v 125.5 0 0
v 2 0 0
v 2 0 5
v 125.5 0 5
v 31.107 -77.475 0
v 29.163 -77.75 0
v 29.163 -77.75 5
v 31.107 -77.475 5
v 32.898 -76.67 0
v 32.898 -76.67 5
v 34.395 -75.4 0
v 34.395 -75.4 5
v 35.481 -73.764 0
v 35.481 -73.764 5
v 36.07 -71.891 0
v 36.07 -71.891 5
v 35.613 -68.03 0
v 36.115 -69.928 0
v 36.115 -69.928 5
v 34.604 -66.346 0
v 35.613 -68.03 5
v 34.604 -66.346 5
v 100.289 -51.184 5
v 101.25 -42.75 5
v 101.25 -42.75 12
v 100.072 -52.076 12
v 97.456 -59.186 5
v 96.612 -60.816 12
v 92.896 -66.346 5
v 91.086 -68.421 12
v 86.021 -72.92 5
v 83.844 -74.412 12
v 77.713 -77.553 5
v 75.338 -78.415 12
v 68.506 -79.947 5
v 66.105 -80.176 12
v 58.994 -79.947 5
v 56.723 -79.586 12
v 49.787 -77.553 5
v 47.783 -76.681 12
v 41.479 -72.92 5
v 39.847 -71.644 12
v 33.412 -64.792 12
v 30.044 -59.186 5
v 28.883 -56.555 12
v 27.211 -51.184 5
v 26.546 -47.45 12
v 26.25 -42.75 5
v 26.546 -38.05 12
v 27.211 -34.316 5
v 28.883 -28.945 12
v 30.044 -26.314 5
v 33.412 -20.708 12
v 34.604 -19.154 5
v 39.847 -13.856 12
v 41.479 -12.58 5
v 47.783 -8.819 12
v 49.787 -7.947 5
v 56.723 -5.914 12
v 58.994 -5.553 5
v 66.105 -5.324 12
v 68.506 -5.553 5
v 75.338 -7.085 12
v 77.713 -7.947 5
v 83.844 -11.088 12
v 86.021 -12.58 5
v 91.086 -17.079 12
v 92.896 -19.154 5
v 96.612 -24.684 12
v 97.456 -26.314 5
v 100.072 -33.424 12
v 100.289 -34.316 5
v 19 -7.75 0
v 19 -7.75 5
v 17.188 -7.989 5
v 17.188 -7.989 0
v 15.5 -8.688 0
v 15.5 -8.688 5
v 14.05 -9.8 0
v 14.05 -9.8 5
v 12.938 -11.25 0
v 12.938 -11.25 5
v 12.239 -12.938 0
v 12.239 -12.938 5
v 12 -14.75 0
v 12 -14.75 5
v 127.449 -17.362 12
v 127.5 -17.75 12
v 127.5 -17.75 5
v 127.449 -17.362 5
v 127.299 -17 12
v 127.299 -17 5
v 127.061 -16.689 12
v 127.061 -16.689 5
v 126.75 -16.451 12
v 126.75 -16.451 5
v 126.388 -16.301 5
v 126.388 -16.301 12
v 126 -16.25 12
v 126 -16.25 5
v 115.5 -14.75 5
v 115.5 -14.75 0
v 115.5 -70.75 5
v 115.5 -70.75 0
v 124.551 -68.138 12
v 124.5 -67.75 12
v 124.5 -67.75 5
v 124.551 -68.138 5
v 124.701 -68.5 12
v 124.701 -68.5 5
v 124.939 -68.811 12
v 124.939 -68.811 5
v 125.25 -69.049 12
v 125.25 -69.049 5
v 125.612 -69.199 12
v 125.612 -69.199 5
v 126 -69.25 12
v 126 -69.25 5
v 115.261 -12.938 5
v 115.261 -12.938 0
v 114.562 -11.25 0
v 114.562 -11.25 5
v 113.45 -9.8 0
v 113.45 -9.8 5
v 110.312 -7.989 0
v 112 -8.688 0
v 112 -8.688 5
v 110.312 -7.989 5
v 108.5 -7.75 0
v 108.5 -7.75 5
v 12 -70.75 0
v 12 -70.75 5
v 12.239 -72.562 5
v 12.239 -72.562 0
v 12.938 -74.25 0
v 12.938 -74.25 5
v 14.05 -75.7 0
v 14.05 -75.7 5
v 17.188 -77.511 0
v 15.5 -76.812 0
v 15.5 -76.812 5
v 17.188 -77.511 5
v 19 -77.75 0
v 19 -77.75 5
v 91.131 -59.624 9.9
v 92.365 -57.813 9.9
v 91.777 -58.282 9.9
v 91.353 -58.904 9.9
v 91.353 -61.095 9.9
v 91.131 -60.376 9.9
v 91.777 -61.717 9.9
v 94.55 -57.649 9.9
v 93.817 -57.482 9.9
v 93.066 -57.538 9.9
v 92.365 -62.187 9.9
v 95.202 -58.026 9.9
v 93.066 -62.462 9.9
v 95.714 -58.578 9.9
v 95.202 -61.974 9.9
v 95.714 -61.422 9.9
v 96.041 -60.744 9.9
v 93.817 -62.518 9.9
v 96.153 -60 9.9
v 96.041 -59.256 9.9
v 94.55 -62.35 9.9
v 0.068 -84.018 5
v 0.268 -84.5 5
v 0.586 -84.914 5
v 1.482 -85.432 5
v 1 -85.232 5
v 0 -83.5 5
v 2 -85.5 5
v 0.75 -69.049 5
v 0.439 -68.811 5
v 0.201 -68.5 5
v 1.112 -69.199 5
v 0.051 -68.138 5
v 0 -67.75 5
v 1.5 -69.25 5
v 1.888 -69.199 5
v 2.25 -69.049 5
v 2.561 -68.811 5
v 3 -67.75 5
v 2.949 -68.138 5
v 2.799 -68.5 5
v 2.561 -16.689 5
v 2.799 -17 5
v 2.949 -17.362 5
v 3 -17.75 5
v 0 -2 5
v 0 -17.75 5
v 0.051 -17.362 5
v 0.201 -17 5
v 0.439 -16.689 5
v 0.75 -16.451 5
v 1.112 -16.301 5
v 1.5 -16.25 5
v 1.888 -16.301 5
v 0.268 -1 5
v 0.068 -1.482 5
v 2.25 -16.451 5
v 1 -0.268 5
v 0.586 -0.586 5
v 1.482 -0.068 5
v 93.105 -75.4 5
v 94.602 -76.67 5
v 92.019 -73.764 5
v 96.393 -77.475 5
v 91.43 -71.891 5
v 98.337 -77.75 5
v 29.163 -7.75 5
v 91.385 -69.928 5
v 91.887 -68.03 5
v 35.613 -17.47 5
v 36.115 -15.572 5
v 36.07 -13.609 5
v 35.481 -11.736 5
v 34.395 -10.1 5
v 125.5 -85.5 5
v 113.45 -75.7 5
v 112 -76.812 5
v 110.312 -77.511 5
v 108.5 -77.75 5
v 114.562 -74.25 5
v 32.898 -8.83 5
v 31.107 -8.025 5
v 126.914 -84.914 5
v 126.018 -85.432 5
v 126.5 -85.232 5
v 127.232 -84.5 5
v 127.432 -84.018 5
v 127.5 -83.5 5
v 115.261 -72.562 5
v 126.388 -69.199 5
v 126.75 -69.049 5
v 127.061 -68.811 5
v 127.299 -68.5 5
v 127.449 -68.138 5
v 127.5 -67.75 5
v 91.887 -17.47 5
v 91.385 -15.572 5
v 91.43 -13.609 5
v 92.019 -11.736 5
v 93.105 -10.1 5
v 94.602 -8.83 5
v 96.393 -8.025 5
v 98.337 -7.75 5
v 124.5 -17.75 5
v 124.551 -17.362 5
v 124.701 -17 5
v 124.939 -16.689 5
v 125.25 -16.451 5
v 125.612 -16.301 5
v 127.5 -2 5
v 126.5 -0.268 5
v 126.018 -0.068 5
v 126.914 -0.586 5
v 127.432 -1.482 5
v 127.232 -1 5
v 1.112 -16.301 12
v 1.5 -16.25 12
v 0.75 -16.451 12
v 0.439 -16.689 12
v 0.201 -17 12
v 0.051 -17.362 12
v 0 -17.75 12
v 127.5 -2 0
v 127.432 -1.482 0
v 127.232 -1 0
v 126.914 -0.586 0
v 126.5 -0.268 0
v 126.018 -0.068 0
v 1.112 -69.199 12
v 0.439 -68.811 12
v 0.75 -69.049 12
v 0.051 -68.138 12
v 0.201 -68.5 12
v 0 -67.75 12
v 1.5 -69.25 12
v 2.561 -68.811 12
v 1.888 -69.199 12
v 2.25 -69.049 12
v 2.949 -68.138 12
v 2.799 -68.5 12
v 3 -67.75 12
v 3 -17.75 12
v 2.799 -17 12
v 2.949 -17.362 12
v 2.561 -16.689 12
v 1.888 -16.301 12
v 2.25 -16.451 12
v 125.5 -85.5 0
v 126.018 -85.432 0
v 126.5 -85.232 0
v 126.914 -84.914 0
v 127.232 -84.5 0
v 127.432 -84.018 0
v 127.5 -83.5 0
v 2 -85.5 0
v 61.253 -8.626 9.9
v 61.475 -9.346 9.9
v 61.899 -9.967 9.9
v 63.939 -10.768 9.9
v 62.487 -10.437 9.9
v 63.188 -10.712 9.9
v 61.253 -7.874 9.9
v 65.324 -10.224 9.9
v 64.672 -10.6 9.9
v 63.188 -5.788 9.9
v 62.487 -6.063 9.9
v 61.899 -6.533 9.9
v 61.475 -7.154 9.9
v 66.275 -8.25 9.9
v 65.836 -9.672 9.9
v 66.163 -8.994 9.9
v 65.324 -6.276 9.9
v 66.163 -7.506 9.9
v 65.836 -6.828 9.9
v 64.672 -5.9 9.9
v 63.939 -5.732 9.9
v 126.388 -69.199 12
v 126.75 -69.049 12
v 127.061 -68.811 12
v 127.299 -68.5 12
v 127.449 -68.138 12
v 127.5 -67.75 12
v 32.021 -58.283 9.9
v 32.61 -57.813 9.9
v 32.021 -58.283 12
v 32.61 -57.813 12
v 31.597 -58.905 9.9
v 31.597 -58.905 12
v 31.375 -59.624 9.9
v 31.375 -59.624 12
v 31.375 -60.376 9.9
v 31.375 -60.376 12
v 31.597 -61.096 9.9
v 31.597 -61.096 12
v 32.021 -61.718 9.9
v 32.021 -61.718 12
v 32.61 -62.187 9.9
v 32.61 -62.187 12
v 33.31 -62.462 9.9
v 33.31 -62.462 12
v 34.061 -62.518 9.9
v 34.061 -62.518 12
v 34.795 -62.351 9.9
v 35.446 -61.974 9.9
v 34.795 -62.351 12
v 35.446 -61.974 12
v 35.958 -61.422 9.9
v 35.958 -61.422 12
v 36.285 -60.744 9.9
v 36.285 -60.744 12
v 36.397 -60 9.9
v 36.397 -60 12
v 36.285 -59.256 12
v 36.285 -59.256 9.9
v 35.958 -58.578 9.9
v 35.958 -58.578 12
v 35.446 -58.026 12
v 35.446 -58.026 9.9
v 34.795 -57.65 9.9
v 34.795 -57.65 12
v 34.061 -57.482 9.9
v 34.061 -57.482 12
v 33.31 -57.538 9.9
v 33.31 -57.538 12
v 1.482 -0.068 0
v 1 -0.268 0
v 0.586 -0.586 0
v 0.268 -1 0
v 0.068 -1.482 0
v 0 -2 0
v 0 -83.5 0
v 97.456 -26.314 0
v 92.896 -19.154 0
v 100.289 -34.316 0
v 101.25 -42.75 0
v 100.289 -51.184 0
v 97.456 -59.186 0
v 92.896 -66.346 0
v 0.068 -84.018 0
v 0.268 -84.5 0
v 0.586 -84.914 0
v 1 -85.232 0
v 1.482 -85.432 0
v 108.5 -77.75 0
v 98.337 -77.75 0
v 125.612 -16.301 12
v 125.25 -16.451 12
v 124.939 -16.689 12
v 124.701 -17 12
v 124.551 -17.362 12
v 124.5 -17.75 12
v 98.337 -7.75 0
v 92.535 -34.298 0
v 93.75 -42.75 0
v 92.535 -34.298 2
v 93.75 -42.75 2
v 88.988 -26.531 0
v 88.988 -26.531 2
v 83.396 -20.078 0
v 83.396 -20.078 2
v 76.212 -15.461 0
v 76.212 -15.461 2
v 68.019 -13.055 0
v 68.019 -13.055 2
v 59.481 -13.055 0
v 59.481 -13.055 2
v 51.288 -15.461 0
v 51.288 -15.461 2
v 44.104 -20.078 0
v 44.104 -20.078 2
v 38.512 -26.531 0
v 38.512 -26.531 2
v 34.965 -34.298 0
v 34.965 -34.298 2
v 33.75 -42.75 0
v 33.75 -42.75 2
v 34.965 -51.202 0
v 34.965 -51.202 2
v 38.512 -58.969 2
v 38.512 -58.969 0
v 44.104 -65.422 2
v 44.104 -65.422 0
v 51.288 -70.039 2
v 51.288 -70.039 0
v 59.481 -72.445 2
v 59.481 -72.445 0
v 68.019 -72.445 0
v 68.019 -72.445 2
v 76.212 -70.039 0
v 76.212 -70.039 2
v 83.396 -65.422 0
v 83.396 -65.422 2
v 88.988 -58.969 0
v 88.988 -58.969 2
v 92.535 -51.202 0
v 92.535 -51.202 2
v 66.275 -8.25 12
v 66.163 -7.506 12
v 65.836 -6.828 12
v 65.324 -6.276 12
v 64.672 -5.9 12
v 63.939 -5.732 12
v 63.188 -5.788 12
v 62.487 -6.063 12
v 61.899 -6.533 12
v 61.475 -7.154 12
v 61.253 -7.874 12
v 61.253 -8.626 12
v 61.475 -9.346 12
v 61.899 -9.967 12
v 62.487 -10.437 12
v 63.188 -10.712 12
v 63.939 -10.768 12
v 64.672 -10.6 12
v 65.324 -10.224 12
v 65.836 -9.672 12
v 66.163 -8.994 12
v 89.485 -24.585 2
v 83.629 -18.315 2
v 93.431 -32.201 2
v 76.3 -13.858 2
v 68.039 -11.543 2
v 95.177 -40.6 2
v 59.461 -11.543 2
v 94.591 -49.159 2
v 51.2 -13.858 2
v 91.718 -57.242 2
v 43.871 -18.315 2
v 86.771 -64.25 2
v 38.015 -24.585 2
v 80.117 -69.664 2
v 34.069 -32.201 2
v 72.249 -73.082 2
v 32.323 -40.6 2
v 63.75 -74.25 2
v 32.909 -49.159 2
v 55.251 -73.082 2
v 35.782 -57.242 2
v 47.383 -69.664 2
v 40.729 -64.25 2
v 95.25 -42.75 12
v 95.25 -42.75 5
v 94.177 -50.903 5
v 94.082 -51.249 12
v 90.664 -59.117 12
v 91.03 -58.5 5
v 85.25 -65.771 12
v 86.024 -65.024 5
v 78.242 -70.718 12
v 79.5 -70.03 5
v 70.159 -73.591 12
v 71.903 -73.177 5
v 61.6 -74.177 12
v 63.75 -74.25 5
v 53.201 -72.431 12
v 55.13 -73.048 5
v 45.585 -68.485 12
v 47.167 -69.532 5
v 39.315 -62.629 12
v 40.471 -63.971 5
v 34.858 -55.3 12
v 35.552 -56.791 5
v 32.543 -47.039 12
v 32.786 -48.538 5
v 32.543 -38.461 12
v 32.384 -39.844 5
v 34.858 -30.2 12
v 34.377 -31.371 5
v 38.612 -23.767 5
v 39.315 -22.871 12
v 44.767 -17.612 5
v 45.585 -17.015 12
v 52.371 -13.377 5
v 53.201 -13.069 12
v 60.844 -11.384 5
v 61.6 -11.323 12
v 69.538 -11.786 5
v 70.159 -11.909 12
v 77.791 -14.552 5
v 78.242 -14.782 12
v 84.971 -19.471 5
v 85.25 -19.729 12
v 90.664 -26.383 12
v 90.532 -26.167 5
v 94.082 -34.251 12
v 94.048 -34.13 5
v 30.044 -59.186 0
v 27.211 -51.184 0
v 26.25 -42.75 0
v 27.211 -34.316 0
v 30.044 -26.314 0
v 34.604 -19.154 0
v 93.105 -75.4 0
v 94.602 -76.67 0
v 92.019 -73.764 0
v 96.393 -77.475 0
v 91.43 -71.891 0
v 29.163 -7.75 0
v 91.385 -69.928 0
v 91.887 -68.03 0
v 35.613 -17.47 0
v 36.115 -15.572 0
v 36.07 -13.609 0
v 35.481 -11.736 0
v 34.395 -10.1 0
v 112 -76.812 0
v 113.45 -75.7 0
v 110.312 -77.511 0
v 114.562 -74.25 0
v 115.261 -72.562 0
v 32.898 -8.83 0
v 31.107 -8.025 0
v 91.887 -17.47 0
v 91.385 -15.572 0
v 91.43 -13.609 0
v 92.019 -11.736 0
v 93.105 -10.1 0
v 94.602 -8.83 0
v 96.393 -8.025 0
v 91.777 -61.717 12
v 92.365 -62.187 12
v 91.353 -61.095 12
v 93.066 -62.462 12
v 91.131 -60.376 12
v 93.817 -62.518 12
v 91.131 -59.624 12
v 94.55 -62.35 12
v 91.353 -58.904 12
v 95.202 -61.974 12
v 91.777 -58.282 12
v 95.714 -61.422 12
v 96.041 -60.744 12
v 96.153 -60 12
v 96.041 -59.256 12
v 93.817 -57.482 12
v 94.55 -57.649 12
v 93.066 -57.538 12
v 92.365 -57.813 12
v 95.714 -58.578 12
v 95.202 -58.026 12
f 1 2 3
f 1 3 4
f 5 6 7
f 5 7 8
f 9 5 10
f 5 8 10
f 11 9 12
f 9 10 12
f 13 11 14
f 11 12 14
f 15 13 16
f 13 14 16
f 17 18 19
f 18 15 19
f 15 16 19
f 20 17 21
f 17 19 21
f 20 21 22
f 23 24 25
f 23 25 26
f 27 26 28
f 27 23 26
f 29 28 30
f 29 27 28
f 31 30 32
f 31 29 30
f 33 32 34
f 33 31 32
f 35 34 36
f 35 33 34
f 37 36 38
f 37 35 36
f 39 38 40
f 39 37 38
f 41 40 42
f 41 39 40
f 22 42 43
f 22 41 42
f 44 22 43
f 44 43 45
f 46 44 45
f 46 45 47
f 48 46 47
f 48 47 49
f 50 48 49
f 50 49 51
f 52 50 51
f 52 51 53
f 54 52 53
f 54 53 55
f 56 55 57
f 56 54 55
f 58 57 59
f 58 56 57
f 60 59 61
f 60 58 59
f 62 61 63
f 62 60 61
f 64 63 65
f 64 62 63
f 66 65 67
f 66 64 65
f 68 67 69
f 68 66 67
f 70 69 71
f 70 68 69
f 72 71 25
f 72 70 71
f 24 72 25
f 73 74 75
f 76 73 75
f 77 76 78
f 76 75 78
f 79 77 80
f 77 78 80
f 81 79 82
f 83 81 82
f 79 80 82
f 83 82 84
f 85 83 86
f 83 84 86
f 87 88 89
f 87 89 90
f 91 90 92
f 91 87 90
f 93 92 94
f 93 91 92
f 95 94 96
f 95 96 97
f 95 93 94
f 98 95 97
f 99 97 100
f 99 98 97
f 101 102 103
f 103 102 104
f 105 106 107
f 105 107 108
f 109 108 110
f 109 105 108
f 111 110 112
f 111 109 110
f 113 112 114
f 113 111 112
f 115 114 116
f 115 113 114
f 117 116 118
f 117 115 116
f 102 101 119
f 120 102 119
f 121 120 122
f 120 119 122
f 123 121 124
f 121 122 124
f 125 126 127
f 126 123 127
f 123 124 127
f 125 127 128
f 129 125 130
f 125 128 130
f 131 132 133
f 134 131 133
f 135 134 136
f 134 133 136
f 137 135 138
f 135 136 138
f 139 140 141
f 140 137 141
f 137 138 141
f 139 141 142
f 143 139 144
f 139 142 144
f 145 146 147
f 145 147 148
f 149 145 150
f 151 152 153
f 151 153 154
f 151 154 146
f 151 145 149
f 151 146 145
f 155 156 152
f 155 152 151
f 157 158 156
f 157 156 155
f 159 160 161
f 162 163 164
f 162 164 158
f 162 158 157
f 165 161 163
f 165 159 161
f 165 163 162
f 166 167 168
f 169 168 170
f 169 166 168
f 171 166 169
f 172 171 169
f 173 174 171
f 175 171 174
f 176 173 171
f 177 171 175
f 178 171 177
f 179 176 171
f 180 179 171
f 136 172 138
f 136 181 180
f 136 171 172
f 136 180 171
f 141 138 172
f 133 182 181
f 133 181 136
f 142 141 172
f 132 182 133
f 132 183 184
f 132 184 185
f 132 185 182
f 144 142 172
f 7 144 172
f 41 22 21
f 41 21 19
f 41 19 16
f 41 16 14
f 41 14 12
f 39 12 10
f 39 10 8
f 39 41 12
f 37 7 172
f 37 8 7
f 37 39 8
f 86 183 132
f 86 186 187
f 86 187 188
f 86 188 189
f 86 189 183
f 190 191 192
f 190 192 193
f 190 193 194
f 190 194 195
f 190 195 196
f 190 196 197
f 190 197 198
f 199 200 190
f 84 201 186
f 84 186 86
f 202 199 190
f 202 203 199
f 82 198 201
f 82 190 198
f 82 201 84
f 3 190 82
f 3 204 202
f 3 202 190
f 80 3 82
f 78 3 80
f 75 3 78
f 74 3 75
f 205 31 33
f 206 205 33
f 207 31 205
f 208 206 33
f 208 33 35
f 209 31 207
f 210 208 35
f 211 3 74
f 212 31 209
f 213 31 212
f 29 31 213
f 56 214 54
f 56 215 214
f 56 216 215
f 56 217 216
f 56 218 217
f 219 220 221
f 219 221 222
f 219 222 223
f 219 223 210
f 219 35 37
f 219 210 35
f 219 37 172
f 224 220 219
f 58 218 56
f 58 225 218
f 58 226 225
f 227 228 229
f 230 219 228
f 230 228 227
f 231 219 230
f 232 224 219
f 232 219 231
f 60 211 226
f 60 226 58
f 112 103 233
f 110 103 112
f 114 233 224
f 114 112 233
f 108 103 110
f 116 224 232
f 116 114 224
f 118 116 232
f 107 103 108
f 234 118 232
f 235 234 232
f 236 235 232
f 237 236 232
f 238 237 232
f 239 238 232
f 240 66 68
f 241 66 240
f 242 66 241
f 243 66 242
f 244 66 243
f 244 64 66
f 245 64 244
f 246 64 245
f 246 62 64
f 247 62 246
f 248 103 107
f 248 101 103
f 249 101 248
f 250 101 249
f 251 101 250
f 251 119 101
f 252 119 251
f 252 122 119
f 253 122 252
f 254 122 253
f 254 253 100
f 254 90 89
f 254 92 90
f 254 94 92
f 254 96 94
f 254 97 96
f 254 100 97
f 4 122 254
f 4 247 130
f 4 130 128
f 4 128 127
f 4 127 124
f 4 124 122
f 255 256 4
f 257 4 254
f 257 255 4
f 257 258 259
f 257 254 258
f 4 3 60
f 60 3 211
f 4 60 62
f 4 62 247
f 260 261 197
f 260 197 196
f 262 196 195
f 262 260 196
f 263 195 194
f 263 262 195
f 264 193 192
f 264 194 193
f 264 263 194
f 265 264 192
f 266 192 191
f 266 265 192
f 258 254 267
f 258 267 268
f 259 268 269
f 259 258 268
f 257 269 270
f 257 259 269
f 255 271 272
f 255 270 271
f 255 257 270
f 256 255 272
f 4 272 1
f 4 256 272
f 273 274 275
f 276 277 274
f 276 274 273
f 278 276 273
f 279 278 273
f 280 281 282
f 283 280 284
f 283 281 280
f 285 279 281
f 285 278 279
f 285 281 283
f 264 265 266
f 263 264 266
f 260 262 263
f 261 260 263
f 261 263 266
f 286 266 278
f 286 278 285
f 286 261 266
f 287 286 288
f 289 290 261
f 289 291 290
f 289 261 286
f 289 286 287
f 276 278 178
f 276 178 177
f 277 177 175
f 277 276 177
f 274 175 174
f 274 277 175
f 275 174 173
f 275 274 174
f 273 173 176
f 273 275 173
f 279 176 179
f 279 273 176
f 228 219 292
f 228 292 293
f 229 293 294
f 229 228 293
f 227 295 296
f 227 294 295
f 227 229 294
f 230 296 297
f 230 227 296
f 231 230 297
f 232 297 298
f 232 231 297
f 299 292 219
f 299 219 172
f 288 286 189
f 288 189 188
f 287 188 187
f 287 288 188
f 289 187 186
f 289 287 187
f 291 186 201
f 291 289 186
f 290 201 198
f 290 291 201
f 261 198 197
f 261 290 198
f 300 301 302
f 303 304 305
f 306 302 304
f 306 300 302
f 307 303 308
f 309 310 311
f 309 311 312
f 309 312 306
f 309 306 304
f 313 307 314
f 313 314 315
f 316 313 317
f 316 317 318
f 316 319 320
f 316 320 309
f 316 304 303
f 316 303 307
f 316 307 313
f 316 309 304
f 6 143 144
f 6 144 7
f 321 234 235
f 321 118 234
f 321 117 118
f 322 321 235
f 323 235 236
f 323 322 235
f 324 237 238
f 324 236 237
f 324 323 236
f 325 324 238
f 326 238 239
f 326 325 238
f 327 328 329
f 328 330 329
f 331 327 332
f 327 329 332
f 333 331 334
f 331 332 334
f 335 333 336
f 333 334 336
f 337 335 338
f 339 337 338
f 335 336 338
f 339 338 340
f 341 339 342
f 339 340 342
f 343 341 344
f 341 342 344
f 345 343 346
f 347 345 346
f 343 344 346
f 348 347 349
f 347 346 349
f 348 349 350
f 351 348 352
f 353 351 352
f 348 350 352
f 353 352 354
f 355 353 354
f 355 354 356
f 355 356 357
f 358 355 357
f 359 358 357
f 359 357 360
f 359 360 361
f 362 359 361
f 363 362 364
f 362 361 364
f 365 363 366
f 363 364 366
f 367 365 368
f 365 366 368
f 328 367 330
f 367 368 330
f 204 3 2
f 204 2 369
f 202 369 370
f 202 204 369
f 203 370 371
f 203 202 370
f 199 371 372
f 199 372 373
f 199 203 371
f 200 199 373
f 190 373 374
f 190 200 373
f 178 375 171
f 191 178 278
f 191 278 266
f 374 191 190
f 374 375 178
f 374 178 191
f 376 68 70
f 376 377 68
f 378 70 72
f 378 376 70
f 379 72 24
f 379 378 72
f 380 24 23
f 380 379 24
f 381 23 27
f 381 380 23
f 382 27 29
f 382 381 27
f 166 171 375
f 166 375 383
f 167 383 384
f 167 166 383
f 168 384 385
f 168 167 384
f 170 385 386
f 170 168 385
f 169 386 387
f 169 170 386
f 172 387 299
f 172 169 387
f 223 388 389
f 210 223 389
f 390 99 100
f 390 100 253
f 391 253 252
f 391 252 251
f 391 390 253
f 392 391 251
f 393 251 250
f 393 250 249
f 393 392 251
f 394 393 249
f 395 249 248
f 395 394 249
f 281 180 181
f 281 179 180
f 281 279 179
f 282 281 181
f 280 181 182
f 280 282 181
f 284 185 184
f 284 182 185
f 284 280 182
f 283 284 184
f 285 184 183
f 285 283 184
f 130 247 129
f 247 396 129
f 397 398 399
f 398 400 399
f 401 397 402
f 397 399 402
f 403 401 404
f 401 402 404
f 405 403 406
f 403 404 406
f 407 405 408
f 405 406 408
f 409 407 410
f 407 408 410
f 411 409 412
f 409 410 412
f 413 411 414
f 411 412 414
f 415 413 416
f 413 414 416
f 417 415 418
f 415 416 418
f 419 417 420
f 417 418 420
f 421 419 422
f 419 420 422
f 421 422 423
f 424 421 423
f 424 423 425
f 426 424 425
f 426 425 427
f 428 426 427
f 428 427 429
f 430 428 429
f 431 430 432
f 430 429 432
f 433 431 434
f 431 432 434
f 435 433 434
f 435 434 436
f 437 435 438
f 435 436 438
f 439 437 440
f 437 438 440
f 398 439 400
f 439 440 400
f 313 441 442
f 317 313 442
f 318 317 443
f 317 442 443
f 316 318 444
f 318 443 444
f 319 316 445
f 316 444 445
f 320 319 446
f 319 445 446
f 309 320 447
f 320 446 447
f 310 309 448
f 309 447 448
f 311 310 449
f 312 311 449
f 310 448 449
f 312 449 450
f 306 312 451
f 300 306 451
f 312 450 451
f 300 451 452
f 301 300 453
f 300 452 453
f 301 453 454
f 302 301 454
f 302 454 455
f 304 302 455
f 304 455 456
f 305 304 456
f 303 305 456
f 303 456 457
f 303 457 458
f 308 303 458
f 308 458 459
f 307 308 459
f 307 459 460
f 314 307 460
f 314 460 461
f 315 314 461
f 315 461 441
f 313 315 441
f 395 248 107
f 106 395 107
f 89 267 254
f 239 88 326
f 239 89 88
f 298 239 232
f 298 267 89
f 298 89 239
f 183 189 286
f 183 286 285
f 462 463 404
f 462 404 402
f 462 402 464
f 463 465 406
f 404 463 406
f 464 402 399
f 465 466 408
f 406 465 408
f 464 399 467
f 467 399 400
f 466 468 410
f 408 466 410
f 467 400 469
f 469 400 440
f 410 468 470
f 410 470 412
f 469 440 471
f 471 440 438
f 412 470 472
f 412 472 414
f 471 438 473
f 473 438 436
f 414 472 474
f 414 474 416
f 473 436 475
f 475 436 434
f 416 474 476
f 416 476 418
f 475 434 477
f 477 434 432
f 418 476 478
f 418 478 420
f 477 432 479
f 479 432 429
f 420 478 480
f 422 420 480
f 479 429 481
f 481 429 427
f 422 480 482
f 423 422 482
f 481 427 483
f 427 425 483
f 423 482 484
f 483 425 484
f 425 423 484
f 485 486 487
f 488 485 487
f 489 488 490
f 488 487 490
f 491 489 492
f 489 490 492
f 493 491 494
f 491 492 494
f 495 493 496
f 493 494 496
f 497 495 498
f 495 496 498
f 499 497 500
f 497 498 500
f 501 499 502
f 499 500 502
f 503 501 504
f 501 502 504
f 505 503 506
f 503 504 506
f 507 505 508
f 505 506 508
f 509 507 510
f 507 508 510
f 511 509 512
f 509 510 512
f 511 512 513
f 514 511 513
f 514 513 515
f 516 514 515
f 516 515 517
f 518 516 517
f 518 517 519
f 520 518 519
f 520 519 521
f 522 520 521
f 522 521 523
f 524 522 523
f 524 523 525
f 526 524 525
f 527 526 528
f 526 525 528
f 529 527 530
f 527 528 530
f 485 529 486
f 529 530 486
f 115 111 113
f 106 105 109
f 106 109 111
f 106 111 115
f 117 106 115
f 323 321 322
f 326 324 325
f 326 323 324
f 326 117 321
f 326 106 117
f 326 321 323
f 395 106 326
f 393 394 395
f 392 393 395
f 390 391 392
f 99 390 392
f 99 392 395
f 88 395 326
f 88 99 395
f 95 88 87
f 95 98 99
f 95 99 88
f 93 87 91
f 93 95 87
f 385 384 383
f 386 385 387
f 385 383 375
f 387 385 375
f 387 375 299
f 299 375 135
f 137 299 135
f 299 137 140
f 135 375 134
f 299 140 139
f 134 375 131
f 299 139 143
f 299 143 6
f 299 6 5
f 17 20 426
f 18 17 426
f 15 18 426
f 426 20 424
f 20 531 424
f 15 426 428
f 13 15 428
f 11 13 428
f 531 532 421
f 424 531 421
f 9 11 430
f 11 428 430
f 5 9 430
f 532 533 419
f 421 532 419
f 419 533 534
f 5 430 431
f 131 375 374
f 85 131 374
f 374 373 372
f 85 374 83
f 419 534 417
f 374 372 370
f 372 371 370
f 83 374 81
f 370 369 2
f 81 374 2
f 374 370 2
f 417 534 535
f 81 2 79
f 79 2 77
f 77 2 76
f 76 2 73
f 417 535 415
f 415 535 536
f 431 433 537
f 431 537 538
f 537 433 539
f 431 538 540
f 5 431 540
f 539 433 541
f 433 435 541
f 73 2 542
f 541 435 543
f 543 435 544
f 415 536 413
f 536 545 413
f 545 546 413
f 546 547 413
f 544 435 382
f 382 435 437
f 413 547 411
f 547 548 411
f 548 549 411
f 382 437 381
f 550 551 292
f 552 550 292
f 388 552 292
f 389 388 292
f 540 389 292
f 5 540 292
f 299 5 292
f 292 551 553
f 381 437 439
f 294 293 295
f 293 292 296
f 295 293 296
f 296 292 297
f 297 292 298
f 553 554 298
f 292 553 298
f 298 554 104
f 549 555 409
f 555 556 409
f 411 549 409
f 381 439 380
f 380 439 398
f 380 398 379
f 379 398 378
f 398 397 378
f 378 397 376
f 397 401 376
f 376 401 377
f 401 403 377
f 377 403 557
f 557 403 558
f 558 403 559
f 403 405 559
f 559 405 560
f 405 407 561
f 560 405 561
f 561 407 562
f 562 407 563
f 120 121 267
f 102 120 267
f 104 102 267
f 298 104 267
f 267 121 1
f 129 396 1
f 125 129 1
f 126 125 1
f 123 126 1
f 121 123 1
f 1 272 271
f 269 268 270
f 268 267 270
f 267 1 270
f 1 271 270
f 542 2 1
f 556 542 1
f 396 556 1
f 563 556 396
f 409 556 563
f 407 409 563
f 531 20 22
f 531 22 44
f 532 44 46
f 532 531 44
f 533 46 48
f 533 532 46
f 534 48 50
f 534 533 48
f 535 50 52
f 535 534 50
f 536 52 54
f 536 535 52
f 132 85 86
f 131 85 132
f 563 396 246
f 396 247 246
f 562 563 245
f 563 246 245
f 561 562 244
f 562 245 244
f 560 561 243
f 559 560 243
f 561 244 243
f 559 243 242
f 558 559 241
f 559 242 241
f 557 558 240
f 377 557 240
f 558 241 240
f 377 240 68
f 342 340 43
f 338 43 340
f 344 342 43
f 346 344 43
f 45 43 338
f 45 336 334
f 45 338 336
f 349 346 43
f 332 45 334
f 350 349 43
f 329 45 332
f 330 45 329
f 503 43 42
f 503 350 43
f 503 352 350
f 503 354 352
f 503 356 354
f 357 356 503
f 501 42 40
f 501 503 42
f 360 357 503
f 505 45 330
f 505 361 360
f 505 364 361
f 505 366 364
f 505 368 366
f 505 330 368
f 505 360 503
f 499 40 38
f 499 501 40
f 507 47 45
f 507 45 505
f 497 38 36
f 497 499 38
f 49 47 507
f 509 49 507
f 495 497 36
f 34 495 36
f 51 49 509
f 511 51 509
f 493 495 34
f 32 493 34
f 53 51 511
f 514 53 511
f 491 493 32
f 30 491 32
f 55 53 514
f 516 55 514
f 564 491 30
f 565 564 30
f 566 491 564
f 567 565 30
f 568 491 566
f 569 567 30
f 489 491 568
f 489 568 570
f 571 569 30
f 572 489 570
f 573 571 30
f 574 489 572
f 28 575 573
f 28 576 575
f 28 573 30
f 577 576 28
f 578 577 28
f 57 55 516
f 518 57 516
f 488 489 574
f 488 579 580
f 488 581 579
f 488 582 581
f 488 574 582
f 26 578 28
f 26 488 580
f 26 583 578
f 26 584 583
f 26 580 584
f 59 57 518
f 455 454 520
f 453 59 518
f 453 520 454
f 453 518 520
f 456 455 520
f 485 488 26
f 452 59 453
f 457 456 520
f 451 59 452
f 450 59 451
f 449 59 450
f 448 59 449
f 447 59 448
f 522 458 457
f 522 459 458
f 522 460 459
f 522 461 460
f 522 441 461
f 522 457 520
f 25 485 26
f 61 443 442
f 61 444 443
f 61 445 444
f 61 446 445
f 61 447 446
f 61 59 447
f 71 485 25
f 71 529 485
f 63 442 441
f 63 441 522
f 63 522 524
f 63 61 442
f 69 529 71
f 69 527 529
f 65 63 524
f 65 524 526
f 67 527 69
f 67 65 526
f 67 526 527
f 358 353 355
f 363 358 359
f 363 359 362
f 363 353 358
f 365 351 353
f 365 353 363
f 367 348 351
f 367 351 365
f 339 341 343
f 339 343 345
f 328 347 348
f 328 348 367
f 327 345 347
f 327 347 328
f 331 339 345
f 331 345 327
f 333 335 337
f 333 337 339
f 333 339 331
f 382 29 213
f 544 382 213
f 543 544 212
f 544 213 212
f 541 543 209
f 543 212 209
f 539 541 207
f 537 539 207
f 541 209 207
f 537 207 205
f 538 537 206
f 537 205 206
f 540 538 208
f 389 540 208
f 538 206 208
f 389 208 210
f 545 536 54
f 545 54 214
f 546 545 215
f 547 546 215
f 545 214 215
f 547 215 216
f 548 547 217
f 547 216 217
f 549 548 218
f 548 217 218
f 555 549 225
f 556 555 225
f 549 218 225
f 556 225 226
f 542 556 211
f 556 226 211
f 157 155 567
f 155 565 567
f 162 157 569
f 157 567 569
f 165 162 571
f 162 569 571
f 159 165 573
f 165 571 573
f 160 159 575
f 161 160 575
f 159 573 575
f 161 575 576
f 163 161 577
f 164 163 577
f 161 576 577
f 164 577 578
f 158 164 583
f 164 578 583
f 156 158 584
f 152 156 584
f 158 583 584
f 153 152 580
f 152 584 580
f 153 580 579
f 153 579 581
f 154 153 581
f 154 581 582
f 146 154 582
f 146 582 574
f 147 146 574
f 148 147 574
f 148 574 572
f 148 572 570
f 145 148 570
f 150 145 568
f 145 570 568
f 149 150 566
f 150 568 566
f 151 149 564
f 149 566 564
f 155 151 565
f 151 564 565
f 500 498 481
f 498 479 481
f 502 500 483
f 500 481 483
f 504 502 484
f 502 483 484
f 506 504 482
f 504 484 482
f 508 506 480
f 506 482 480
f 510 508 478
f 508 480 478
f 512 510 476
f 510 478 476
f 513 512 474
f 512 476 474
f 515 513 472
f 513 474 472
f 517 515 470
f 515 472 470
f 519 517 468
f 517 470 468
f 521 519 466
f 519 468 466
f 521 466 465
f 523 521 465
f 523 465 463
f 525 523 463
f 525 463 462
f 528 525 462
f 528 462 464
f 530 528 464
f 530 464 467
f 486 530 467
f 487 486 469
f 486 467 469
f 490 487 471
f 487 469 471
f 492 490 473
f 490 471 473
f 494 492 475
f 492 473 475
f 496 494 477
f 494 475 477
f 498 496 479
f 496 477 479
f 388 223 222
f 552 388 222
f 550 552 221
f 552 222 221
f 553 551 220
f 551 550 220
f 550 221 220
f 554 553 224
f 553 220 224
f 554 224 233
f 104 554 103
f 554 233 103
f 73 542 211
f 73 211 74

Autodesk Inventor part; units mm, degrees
ref_plane "YZ Plane" through (0, 0, 0) normal (1, 0, 0) x (0, 1, 0)
ref_plane "XZ Plane" through (0, 0, 0) normal (0, 1, 0) x (-1, 0, 0)
ref_plane "XY Plane" through (0, 0, 0) normal (0, 0, 1) x (1, 0, 0)
sketch "Skizze1" plane through (0, 0, 0) normal (0, 0, 1) x (1, 0, 0)
  line L0 (0, 0) -> (127.5, 0)
  line L1 (127.5, 0) -> (127.5, -85.5)
  line L2 (127.5, -85.5) -> (0, -85.5)
  line L3 (0, -85.5) -> (0, 0)
  dimension "d0" = 127.5
  dimension "d1" = 85.5
extrude "Extrusion1" add sketch "Skizze1" along normal blind 5
sketch "Skizze2" plane through (0, 0, 5) normal (0, 0, 1) x (1, 0, 0)
  line L0 (0, -16.25) -> (3, -16.25)
  line L1 (3, -16.25) -> (3, -69.25)
  line L2 (3, -69.25) -> (0, -69.25)
  line L3 (0, -69.25) -> (0, -16.25)
  line L4 (63.75, 42.9175) -> (63.75, -147.2432)
  line L5 (127.5, -85.5) -> (127.5, 0) projected
  line L6 (127.5, -16.25) -> (124.5, -16.25)
  line L7 (124.5, -16.25) -> (124.5, -69.25)
  line L8 (124.5, -69.25) -> (127.5, -69.25)
  line L9 (127.5, -69.25) -> (127.5, -16.25)
  point P0 (0, 0)
  dimension "d4" = 3
  dimension "d5" = 53
  dimension "d6" = 16.25
  dimension "d7" = 63.75
extrude "Extrusion2" add sketch "Skizze2" along normal blind 7
fillet "Rundung1" radius 2 4 edges at (0, 0, 2.5) (127.5, 0, 2.5) (127.5, -85.5, 2.5) (0, -85.5, 2.5)
fillet "Rundung2" radius 1.5 8 edges at (3, -69.25, 8.5) (0, -69.25, 8.5) (3, -16.25, 8.5) (0, -16.25, 8.5) (124.5, -16.25, 8.5) (127.5, -16.25, 8.5) (124.5, -69.25, 8.5) (127.5, -69.25, 8.5)
sketch "Skizze3" plane through (0, 0, 5) normal (0, 0, 1) x (1, 0, 0)
  circle A0 centre (63.75, -42.75) radius 30
  line L0 (0, -67.75) -> (0, -83.5) projected
  point P0 (0, 0)
  dimension "d12" = 60
  dimension "d13" = 63.75
  dimension "d14" = 42.75
extrude "Extrusion3" cut sketch "Skizze3" against normal blind 10
hole "Bohrung1" at (63.75, -42.75, 5) direction (0, 0, -1) diameter 63 depth 3
sketch "Skizze4" plane through (0, 0, 0) normal (0, 0, -1) x (-1, 0, 0)
  line L0 (-125.5, -85.5) -> (-2, -85.5) projected
  line L1 (0, -83.5) -> (0, -2) projected
  line L2 (-12, -77.75) -> (-50.2871, -77.75)
  line L3 (-50.2871, -7.75) -> (-12, -7.75)
  line L4 (-12, -7.75) -> (-12, -77.75)
  line L5 (-63.75, -42.75) -> (-63.75, -99.3052)
  line L6 (-115.5, -77.75) -> (-77.2129, -77.75)
  line L7 (-77.2129, -7.75) -> (-115.5, -7.75)
  line L8 (-115.5, -7.75) -> (-115.5, -77.75)
  arc A0 (-50.2871, -77.75) -> (-50.2871, -7.75) centre (-63.75, -42.75) ccw
  arc A1 (-77.2129, -7.75) -> (-77.2129, -77.75) centre (-63.75, -42.75) ccw
  arc A2 (-50.2871, -77.75) -> (-50.2871, -7.75) centre (-63.75, -42.75) ccw
  arc A3 (-77.2129, -7.75) -> (-77.2129, -77.75) centre (-63.75, -42.75) ccw
  point P0 (0, 0)
  dimension "d27" = 42.75
  dimension "d28" = 63.75
  dimension "d29" = 12
  dimension "d30" = 70
  dimension "d31" = 7.75
extrude "Extrusion4" cut sketch "Skizze4" against normal blind 10
fillet "Rundung3" radius 7 4 edges at (50.2871, -77.75, 2.5) (77.2129, -77.75, 2.5) (50.2871, -7.75, 2.5) (77.2129, -7.75, 2.5)
fillet "Rundung4" radius 7 4 edges at (12, -77.75, 2.5) (115.5, -77.75, 2.5) (12, -7.75, 2.5) (115.5, -7.75, 2.5)
sketch "Skizze5" plane through (0, 0, 5) normal (0, 0, 1) x (1, 0, 0)
  circle A0 centre (63.75, -42.75) radius 31.5
  circle A1 centre (63.75, -42.75) radius 37.5
  line L0 (125.5, 0) -> (2, 0) projected
  point P0 (0, 0)
  dimension "d36" = 63
  dimension "d37" = 75
  dimension "d38" = 42.75
  dimension "d39" = 63.75
extrude "Extrusion5" add sketch "Skizze5" along normal blind 7
sketch "Skizze6" plane through (63.75, -42.75, 12) normal (0, 0, 1) x (1, 0, 0)
  circle A0 centre (-0.0001, 34.5) radius 2.525
  circle A1 centre (0, 0) radius 31.5 projected
  point P0 (-63.75, 42.75)
  dimension "d42" = 5.05
  dimension "d43" = 34.5
extrude "Extrusion6" cut sketch "Skizze6" against normal blind 2.1 contours A0
pattern_circular "Runde Anordnung1" count 3 over 360 about axis through (63.75, -42.75, 3.5) along (0, 0, 1) of "Extrusion6"
properties part number "Sensor Halterung63"
